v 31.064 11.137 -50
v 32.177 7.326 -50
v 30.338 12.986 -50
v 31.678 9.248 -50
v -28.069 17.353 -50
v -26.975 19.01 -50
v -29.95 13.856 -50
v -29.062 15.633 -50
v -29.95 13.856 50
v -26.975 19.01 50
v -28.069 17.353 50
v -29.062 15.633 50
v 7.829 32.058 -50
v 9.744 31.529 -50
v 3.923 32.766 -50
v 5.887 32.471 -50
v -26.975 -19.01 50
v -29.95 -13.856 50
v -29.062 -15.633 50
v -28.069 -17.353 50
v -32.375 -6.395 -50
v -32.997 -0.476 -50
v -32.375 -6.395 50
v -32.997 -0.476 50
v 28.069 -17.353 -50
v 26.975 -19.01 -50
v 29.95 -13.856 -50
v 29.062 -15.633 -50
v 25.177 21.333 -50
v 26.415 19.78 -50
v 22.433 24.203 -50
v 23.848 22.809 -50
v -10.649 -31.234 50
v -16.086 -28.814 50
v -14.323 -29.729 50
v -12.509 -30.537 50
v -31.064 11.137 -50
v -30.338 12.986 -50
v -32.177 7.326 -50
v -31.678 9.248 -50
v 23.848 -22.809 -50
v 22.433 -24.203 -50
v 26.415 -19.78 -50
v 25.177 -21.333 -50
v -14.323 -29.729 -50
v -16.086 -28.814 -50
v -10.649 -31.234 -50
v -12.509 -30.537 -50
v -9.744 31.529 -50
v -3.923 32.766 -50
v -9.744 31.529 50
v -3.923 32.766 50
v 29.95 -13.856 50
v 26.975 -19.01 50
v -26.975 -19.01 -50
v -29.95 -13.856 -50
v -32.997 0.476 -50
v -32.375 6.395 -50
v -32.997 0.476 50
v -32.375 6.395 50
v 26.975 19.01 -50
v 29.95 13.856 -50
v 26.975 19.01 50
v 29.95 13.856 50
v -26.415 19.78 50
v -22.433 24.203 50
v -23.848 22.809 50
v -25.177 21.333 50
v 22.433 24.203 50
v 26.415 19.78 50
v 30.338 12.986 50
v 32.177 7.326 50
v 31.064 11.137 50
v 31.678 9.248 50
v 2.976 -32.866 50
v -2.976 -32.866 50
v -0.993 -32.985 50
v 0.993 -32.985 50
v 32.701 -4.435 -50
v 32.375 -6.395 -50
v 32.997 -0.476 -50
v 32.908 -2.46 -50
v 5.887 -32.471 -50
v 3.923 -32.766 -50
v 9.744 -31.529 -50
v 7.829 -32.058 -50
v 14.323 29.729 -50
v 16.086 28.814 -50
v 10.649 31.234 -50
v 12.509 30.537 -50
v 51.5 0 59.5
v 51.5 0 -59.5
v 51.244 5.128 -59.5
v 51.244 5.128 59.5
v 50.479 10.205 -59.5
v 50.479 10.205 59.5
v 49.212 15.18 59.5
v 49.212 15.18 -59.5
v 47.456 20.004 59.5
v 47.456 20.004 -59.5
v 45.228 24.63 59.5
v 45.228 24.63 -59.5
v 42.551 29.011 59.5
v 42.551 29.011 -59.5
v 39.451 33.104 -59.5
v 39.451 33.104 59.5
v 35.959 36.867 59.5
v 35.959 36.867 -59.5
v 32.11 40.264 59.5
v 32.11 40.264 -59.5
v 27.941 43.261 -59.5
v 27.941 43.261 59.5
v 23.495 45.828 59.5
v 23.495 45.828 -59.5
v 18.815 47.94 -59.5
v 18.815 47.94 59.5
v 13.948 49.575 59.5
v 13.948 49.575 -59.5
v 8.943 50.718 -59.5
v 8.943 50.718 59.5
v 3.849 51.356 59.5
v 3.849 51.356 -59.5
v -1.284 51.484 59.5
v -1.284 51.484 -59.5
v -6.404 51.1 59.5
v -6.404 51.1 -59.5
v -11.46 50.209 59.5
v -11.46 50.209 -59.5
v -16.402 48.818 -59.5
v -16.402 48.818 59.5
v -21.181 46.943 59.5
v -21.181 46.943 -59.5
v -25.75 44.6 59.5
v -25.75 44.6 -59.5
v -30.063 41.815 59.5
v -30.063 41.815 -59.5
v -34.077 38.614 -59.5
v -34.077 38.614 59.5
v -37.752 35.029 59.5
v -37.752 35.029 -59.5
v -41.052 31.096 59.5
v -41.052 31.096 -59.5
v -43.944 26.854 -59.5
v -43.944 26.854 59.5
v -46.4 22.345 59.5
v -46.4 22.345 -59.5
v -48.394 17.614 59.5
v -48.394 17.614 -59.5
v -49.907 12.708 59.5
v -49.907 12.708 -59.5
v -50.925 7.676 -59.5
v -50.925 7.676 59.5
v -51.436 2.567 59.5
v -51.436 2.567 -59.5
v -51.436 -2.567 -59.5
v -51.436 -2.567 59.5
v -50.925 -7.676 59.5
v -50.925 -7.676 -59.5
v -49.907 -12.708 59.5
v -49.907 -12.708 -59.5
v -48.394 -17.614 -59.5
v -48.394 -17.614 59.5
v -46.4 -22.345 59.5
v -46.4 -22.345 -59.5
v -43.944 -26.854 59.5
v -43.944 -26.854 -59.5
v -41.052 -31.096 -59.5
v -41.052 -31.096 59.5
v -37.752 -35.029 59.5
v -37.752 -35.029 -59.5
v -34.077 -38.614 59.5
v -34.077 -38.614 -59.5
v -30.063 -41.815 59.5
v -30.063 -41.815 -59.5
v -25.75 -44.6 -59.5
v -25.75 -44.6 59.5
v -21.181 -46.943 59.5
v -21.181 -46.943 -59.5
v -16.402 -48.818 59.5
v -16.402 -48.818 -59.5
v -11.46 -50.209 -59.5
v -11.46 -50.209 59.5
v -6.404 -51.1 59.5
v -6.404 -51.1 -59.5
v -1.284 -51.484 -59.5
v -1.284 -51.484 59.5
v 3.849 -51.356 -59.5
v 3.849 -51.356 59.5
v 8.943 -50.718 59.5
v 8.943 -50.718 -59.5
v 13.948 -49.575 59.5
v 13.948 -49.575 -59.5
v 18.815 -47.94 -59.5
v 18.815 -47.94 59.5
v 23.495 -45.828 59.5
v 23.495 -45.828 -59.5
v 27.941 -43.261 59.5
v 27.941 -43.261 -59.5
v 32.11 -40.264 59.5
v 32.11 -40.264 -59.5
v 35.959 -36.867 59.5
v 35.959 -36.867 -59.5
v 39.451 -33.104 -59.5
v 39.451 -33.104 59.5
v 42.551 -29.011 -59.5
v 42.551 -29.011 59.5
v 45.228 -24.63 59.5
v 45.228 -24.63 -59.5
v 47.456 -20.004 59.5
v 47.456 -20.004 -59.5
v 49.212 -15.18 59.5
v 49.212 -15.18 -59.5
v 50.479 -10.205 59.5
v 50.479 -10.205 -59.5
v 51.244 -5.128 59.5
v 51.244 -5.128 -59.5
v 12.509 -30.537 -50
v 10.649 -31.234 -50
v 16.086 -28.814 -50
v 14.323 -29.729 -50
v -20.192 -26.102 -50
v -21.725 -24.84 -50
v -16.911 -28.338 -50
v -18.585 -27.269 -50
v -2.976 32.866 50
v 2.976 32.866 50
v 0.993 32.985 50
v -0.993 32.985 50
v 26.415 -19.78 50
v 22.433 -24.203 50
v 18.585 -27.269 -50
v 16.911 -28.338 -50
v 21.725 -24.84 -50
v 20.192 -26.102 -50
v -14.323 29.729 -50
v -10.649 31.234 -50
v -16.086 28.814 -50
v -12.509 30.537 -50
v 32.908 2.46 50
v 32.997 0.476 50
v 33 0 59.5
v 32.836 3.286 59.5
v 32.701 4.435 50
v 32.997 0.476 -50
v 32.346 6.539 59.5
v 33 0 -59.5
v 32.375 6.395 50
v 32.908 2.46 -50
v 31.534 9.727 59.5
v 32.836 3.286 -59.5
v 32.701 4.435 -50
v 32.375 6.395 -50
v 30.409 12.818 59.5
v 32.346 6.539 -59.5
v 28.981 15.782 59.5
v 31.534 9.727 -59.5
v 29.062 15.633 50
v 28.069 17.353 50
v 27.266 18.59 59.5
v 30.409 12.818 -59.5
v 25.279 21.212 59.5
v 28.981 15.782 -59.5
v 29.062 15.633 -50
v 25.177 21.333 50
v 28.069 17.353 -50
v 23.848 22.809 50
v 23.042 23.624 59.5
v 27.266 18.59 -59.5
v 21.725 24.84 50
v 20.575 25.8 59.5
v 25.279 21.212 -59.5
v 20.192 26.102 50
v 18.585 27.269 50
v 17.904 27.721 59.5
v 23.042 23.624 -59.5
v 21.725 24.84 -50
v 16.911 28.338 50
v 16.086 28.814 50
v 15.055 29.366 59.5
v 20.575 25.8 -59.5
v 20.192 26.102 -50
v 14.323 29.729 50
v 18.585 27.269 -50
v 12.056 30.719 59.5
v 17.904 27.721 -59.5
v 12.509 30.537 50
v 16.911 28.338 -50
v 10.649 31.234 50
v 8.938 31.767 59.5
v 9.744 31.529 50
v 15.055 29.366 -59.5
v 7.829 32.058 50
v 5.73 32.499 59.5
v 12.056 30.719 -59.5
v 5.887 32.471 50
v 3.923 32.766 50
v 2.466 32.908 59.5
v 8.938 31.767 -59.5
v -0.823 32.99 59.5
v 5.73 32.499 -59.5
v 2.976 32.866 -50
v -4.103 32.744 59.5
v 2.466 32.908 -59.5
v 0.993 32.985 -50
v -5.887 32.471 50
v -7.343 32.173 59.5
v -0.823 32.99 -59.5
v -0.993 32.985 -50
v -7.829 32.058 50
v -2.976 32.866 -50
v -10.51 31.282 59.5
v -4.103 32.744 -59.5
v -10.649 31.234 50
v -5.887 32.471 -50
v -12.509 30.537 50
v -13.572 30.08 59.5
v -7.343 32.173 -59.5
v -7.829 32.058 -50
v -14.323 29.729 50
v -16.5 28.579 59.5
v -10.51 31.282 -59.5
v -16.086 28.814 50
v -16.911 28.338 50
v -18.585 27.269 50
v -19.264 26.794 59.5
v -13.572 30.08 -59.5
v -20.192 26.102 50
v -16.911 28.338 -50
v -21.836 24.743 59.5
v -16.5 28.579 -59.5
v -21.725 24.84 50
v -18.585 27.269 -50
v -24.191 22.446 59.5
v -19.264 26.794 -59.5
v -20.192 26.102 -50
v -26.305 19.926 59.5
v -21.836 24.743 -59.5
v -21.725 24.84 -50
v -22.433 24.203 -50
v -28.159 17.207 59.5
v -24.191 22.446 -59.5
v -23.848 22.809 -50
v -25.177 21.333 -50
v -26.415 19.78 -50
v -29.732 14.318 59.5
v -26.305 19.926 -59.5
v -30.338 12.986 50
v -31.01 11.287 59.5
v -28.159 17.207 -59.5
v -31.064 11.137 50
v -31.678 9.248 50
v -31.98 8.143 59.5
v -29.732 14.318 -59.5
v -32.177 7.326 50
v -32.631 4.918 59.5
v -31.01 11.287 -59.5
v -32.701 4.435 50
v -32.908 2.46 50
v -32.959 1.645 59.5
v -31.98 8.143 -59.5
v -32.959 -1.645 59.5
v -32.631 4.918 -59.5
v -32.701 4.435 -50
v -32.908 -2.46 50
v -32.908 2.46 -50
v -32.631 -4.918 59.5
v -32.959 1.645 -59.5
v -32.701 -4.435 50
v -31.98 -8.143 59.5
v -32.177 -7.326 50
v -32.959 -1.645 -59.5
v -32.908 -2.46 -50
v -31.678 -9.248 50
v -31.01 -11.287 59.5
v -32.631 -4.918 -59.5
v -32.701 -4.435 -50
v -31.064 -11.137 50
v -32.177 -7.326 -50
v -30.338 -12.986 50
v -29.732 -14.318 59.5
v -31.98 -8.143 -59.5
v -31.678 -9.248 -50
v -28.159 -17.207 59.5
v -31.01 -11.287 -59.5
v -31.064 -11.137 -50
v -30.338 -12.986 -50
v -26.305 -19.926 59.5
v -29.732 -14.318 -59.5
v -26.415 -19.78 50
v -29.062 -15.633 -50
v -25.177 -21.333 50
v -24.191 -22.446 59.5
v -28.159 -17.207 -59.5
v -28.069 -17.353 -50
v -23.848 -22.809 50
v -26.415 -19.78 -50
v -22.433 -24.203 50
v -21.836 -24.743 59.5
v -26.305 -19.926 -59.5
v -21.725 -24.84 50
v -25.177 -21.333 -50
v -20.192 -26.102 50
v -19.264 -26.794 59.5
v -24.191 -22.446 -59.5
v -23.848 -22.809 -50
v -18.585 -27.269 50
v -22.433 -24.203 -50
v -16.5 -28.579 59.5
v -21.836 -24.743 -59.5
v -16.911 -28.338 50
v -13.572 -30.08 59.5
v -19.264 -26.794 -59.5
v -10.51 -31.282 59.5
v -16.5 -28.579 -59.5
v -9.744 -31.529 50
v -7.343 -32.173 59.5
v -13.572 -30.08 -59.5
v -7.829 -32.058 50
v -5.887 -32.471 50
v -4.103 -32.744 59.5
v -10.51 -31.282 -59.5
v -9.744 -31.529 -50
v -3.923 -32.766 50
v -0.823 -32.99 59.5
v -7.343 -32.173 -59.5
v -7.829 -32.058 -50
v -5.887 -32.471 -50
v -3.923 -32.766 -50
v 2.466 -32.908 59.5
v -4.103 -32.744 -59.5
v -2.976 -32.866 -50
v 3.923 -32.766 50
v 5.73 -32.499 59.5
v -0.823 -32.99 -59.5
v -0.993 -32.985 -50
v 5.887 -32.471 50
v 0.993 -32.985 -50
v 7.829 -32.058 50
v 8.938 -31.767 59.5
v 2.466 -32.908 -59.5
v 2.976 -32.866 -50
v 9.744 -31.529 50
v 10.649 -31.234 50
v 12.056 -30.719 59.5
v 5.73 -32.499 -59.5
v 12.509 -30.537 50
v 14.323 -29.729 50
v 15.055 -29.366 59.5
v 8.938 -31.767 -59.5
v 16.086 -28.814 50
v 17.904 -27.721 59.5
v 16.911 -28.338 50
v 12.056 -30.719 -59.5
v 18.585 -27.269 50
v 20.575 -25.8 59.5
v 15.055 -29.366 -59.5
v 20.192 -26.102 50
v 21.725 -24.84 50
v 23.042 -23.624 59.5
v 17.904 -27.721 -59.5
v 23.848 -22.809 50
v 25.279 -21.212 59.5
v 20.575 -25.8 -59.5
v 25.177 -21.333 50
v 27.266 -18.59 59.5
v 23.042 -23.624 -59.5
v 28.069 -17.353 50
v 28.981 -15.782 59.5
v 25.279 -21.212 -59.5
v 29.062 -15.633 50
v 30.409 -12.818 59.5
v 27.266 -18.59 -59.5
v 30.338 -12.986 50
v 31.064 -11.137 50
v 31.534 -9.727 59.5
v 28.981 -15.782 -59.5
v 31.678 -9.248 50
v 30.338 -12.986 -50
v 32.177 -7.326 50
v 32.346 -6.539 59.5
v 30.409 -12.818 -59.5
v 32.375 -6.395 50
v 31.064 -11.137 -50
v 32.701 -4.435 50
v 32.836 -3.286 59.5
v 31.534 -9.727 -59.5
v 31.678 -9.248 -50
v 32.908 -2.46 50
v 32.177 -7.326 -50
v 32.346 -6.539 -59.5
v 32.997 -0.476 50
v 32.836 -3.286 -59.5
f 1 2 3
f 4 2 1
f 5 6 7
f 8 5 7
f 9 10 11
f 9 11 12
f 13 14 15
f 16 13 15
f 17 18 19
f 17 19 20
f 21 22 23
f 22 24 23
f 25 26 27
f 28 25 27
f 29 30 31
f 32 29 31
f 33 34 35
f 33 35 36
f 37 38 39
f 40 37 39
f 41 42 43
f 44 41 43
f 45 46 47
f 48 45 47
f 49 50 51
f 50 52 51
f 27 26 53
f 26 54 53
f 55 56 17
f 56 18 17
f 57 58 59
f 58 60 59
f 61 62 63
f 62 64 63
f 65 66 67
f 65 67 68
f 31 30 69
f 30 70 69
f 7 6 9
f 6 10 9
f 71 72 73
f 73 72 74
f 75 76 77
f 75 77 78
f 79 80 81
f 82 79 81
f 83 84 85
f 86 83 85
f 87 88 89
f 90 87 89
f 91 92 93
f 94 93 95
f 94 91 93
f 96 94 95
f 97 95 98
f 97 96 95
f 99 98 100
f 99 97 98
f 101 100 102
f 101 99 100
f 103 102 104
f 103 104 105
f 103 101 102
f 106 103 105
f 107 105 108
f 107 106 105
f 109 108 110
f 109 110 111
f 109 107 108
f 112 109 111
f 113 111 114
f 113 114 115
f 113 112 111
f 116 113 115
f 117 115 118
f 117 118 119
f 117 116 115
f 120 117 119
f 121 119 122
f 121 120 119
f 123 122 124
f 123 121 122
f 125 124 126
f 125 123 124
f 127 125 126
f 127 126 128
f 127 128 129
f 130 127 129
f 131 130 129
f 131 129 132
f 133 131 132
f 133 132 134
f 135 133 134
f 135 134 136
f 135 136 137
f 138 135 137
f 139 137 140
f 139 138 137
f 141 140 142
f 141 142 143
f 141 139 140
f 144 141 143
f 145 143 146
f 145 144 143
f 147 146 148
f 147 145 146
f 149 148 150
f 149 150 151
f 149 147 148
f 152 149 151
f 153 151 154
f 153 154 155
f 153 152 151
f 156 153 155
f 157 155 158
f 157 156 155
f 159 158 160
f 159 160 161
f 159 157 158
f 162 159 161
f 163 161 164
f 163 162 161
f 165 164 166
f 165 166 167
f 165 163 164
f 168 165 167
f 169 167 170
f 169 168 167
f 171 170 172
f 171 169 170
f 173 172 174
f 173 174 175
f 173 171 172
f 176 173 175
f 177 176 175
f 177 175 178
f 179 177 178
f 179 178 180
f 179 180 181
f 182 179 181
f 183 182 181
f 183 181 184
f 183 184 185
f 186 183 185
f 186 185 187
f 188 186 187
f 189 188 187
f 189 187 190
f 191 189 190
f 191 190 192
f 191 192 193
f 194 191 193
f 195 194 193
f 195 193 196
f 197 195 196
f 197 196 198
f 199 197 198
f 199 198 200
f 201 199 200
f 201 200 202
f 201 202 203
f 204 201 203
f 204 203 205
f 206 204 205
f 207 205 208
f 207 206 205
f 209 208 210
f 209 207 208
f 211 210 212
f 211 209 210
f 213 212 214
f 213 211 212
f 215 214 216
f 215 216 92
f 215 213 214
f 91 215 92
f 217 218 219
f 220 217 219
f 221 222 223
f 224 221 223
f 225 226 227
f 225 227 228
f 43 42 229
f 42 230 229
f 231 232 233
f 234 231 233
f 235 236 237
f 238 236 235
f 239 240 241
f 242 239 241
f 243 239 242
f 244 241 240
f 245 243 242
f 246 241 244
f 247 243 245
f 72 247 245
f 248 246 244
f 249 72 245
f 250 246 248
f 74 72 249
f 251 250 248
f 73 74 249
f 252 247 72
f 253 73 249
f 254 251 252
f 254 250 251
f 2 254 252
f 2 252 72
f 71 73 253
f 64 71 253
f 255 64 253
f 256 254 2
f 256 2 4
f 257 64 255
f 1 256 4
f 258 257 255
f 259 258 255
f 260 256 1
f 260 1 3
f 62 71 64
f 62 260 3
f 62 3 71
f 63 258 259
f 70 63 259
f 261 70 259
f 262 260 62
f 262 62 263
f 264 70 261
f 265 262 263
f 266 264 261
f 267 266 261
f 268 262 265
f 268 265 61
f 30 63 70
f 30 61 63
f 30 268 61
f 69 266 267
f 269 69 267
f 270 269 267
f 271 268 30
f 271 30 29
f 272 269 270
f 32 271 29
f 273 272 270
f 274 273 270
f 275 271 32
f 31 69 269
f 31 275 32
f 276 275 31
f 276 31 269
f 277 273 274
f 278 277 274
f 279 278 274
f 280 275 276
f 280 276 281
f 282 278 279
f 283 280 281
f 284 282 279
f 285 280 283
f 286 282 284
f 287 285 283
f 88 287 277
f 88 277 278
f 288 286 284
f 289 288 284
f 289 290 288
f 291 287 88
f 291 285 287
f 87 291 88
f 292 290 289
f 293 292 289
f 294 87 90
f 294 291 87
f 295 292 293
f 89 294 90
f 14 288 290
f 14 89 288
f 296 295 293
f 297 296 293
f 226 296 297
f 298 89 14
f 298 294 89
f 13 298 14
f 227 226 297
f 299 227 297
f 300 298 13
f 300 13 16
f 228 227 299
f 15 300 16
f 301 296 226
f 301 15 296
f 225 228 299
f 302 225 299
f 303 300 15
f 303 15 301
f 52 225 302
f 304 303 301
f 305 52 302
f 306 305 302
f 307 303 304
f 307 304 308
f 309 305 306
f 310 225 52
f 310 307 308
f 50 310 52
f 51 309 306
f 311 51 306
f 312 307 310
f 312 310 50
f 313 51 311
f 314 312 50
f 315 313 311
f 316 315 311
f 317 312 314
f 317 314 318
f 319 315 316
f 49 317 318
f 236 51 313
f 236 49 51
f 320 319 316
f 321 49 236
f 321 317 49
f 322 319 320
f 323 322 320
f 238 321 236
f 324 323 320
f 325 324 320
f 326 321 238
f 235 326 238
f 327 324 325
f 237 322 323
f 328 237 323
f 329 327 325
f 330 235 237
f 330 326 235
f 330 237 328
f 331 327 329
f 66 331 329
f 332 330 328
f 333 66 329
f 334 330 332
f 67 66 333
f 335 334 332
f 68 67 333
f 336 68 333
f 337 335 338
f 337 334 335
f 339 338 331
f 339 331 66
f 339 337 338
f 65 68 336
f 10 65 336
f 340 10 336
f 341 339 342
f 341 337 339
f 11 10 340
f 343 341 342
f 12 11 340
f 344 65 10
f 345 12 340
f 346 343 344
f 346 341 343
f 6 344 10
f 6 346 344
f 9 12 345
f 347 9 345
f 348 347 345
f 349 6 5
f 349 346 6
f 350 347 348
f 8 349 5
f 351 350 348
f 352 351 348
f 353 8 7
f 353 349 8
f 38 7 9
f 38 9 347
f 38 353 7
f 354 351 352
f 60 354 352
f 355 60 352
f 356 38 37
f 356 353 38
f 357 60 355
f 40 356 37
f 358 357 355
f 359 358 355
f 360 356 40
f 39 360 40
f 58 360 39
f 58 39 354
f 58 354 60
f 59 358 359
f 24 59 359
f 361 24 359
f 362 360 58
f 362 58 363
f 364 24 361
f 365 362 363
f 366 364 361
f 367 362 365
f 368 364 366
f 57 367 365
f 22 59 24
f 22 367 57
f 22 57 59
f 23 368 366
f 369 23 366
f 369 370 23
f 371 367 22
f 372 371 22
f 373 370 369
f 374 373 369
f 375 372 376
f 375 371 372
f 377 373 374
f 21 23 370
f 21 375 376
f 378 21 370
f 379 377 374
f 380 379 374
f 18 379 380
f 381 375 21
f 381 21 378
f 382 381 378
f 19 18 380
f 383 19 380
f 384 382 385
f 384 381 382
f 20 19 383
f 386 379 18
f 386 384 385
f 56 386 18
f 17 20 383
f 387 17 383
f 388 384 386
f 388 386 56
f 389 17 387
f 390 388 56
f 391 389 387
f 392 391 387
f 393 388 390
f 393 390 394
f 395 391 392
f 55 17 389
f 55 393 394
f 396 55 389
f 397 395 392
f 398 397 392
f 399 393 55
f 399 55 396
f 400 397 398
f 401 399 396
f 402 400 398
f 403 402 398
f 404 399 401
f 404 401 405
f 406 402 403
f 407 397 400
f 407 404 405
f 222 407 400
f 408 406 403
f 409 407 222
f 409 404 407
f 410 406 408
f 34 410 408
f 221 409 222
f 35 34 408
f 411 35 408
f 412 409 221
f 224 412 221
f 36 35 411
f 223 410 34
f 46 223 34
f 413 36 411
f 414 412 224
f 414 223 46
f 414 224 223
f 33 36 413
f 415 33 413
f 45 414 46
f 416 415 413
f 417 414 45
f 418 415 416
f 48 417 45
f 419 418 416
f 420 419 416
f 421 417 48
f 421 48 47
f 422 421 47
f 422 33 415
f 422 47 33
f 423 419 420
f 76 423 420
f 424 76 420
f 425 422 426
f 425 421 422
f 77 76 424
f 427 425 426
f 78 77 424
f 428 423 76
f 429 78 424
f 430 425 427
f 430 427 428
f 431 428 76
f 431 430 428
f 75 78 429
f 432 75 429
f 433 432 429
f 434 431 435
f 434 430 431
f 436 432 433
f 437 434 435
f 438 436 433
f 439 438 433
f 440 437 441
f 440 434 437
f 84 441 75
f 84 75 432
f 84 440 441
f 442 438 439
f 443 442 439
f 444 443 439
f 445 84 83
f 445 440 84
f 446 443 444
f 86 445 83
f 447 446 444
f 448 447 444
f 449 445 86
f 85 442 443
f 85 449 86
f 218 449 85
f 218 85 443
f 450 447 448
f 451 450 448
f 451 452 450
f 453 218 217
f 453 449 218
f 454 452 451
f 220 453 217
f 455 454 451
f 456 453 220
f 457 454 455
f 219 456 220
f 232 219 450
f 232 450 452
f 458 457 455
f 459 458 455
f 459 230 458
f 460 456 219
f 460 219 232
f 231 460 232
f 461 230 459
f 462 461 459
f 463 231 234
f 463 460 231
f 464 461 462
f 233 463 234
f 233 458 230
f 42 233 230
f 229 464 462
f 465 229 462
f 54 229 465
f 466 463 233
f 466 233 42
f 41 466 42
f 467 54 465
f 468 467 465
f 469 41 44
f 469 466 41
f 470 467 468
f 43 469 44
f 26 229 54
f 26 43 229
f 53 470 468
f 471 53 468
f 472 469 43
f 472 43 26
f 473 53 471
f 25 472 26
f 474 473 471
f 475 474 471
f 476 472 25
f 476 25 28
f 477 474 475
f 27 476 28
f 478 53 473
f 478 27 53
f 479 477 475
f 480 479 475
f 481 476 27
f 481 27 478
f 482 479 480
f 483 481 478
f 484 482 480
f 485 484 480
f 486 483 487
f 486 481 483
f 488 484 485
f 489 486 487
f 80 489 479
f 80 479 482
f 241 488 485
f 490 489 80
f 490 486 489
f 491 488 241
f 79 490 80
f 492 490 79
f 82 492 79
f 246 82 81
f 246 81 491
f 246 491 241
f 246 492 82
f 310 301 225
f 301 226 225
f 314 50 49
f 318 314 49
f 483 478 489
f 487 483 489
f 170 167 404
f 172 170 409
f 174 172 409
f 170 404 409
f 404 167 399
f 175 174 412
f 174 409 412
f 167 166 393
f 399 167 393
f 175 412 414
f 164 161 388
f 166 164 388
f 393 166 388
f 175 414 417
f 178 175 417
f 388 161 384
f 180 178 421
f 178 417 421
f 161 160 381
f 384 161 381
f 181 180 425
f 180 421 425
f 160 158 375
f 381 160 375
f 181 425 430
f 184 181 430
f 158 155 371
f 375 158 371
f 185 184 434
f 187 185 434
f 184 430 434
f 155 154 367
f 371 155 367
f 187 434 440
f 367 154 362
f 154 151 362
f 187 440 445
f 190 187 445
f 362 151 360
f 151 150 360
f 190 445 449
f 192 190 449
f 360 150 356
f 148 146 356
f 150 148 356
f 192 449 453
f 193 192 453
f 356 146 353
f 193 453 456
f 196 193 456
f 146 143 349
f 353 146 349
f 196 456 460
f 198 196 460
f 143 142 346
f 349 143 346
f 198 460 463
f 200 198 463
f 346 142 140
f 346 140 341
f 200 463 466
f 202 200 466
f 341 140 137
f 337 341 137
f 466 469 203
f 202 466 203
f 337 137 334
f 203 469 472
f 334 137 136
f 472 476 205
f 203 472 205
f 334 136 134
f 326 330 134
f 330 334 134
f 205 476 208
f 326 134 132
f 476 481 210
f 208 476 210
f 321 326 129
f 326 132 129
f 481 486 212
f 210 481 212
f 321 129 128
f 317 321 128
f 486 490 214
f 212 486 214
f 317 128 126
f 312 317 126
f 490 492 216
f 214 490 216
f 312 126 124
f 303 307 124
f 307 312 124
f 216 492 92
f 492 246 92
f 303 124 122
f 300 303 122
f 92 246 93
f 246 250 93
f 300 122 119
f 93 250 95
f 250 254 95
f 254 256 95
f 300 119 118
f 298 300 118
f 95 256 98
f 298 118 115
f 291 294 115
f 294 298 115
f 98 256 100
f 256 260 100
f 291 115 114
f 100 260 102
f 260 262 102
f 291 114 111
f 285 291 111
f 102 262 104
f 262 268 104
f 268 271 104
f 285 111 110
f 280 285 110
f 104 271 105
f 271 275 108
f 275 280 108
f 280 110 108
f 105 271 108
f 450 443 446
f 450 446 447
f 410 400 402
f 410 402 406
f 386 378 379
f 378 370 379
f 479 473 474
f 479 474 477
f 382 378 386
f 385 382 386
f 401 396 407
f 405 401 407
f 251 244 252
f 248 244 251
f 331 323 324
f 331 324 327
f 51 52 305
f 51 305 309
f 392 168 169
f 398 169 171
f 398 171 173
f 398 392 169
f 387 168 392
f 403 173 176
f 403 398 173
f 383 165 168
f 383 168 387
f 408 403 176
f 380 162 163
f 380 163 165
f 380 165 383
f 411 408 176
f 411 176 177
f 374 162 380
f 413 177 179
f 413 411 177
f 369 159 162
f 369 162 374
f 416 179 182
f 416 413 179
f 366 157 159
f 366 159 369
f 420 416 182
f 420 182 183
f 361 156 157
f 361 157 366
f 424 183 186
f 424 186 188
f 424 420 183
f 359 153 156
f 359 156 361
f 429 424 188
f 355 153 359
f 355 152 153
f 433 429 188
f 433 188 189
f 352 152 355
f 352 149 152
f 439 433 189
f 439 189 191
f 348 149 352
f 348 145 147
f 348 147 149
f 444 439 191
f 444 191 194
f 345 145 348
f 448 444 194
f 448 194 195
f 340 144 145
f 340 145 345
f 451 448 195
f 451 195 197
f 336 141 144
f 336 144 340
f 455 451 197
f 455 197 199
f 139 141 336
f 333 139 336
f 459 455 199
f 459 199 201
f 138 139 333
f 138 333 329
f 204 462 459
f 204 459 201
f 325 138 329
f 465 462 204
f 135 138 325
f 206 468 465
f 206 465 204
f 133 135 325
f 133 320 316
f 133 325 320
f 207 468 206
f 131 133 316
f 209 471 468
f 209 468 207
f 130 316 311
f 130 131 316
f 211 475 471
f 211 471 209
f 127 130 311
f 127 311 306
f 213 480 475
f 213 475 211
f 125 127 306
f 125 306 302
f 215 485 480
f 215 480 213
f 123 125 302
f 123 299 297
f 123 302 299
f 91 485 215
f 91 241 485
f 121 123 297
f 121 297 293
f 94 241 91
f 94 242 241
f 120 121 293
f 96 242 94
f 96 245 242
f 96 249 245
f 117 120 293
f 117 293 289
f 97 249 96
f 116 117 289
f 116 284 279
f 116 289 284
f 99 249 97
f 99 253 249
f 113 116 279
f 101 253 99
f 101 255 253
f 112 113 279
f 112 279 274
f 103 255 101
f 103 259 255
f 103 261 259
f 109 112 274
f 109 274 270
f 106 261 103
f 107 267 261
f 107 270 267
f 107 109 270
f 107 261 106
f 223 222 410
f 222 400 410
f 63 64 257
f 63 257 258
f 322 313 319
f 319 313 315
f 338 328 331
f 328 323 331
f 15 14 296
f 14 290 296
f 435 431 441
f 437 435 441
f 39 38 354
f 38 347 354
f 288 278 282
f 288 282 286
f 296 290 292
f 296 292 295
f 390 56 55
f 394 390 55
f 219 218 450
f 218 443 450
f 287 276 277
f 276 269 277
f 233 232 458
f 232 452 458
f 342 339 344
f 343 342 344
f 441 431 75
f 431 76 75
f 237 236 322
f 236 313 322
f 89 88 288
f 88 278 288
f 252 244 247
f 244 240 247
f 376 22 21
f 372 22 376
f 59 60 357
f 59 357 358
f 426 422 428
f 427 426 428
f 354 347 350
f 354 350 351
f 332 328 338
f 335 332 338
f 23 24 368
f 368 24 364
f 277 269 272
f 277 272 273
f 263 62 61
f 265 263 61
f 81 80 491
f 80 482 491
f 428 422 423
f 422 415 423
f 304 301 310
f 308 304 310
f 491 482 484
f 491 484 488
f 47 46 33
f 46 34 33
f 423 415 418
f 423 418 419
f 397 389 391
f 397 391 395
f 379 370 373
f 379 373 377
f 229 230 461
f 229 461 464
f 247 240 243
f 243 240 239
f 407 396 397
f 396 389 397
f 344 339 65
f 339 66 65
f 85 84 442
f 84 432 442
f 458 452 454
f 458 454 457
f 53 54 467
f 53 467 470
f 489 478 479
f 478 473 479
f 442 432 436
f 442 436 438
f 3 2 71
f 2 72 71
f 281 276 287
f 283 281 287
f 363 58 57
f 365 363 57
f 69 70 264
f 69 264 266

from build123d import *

# Parameters (mm, degrees)
SKETCH1_R           = 51.5
SKETCH1_R_2         = 33
BOSS_EXTRUDE1_DEPTH = 59.5
SKETCH2_W           = 5.951131742
SKETCH2_H           = 4.923958597
BOSS_EXTRUDE2_DEPTH = 50
CIRPATTERN1_COUNT   = 30


with BuildPart() as part:
    # Sketch1 → Boss-Extrude1 (new, symmetric)
    with BuildSketch(Plane.XY):
        Circle(SKETCH1_R)
        Circle(SKETCH1_R_2, mode=Mode.SUBTRACT)
    extrude(amount=BOSS_EXTRUDE1_DEPTH, both=True)

    # Sketch2 → Boss-Extrude2 (add, symmetric)
    with BuildSketch(Plane.XY):
        with Locations((0, -35.327554111)):
            Rectangle(SKETCH2_W, SKETCH2_H)
    boss_extrude2 = extrude(amount=BOSS_EXTRUDE2_DEPTH, both=True)

    # CirPattern1: Boss-Extrude2 ×30 about axis
    cirpattern1_axis = Axis((0, 0, 0), (0, 0, 1))
    for i in range(1, CIRPATTERN1_COUNT):
        add(boss_extrude2.rotate(cirpattern1_axis, i * 360 / CIRPATTERN1_COUNT))


solid = part.part
